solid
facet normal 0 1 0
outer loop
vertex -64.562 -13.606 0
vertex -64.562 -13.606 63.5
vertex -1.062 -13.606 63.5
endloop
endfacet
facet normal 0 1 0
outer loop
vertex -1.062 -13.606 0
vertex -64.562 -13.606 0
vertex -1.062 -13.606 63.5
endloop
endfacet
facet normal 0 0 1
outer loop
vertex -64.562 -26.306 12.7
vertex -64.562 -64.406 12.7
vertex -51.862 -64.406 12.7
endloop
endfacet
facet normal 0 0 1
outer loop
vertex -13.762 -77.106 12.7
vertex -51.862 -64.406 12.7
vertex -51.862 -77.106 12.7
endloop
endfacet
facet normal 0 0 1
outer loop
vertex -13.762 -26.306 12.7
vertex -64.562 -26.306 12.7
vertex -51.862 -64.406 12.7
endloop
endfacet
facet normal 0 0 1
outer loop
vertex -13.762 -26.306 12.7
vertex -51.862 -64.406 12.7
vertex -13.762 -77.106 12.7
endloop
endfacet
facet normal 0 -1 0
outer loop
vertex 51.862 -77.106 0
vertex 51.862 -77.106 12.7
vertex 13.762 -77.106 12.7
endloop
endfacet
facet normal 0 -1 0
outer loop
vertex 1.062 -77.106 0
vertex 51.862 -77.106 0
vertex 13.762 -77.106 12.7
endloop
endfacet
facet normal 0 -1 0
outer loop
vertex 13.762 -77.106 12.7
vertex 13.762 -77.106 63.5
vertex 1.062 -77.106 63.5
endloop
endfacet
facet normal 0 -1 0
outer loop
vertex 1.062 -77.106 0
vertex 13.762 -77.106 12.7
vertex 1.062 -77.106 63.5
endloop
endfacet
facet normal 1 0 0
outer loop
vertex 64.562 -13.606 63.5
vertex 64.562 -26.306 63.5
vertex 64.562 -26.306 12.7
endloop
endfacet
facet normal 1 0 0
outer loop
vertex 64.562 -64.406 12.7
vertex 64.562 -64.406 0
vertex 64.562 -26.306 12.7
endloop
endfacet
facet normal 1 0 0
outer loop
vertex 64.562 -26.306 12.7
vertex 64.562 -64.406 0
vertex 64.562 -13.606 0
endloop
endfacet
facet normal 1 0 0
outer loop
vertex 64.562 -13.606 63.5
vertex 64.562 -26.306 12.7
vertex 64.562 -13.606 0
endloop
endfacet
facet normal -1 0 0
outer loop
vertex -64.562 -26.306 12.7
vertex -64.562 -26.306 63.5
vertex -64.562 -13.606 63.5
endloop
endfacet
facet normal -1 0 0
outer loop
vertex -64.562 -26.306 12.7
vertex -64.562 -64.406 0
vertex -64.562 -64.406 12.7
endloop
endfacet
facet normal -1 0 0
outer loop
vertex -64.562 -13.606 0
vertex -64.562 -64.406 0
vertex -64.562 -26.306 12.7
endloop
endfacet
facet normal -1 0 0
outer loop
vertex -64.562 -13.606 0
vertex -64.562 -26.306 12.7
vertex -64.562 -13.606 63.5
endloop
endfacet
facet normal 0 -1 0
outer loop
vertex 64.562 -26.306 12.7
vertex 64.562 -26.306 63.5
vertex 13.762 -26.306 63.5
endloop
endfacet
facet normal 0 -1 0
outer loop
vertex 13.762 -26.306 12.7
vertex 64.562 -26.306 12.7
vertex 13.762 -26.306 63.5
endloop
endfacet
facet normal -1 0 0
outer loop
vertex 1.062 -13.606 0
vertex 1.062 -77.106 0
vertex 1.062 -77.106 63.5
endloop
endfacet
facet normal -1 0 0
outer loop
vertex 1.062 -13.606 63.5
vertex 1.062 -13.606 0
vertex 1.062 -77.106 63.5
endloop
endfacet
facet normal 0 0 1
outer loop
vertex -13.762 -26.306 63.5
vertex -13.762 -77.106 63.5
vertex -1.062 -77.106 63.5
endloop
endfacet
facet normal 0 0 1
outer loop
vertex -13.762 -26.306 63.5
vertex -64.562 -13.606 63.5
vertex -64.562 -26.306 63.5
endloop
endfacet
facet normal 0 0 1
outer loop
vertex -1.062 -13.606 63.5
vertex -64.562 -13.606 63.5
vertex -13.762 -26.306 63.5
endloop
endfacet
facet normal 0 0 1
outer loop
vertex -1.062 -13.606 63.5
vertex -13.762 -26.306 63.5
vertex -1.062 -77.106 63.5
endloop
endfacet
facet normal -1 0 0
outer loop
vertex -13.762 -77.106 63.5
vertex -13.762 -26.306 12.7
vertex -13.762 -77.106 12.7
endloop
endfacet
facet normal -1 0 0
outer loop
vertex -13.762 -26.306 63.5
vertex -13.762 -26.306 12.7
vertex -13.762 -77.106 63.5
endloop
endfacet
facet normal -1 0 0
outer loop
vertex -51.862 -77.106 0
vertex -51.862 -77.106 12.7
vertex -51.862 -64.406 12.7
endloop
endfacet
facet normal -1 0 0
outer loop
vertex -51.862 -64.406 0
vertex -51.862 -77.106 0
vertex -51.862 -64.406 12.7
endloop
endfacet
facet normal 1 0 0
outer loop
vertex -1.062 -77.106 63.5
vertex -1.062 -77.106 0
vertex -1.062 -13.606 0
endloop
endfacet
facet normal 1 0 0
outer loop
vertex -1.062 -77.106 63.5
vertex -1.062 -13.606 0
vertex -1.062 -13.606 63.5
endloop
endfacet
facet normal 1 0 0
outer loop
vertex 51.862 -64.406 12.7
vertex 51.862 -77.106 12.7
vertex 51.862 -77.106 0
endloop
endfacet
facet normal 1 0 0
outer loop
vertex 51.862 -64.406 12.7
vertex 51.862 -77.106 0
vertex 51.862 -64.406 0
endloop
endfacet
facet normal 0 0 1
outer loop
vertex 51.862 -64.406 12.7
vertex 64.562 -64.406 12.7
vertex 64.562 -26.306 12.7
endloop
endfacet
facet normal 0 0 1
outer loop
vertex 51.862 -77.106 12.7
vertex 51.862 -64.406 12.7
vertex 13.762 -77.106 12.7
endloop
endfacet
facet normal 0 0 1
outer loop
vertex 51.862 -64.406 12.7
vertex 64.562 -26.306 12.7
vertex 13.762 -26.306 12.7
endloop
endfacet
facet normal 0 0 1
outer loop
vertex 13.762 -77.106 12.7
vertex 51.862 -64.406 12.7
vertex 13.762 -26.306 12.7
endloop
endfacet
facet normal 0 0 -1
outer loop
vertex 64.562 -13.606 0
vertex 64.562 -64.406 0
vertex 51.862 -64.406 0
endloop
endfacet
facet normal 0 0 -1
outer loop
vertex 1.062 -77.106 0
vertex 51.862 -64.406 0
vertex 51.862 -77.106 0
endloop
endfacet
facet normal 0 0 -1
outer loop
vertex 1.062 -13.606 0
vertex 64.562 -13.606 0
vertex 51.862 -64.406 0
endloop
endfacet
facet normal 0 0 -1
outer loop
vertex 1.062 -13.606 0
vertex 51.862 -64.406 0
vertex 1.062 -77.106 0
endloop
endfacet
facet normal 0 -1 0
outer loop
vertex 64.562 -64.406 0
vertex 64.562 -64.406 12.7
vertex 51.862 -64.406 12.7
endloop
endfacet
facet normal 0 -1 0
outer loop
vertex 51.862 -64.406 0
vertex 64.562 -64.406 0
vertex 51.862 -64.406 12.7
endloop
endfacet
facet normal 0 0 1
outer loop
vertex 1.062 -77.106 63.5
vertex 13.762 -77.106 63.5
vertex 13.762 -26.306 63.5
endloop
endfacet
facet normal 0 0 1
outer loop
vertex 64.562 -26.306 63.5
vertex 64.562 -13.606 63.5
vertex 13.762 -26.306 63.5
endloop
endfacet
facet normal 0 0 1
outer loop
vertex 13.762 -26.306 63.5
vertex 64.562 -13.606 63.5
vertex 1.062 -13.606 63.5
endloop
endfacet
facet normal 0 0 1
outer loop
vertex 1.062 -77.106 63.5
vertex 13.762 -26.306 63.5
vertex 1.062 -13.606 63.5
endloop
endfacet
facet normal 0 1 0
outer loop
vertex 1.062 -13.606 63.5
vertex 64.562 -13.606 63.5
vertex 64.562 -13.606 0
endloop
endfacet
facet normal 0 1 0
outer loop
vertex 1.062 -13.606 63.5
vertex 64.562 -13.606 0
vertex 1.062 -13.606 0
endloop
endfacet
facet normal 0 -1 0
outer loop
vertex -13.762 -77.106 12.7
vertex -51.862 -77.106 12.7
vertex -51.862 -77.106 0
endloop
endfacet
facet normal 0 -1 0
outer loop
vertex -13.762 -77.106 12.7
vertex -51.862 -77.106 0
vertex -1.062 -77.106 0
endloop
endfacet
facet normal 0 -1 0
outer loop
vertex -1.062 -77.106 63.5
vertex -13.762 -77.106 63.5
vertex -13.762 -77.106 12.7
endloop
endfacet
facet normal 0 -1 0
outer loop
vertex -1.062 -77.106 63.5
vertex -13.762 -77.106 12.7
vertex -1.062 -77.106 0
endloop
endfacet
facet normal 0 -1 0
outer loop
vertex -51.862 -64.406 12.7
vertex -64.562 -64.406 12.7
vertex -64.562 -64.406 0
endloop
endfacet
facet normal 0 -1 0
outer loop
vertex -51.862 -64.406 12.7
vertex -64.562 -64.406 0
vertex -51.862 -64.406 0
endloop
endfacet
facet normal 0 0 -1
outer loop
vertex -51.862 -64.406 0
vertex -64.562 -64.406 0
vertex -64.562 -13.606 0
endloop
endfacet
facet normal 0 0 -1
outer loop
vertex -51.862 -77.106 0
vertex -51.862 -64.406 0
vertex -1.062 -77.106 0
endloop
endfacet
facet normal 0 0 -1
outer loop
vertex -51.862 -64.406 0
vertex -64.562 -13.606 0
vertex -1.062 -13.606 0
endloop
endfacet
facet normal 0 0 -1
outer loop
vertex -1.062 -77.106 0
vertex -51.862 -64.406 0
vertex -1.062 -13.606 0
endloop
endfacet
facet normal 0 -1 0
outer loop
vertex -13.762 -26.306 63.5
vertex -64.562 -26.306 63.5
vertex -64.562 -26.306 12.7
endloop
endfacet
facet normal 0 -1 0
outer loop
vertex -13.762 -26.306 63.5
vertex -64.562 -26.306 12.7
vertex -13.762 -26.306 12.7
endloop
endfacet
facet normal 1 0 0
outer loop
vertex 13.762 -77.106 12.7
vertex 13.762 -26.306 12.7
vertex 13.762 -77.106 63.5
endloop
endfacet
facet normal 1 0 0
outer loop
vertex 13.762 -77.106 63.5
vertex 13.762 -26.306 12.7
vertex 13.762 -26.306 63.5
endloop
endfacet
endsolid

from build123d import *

# Parameters (mm, degrees)
F0_W     = 50.8
F0_H     = 12.7
F1_DEPTH = 12.7
F2_W     = 63.5
F2_H     = 12.7
F3_DEPTH = 50.8
F4_W     = 12.7
F4_H     = 50.8
F5_DEPTH = 50.8


with BuildPart() as f1:
    # F0 (on Top) → F1 (new body)
    with BuildSketch(Plane.XY):
        with Locations((-26.462255, -70.755516)):
            Rectangle(F0_W, F0_H)
        Polygon((-64.562255, -13.605516), (-64.562255, -64.405516), (-51.862255, -64.405516), (-1.062255, -64.405516), (-1.062255, -13.605516), align=None)
    extrude(amount=F1_DEPTH)

    # F2 (on face) → F3 (join)
    with BuildSketch(Plane.XY.offset(12.7)):
        with Locations((-32.812255, -19.955516)):
            Rectangle(F2_W, F2_H)
    extrude(amount=F3_DEPTH)

    # F4 (on face) → F5 (join)
    with BuildSketch(Plane.XZ.offset(26.305516)):
        with Locations((-7.412255, 38.1)):
            Rectangle(F4_W, F4_H)
    extrude(amount=F5_DEPTH)


with BuildPart() as f6_1:
    # F6: instance of F1
    add(f1.part.mirror(Plane.YZ))


solid = Compound([f1.part, f6_1.part])
